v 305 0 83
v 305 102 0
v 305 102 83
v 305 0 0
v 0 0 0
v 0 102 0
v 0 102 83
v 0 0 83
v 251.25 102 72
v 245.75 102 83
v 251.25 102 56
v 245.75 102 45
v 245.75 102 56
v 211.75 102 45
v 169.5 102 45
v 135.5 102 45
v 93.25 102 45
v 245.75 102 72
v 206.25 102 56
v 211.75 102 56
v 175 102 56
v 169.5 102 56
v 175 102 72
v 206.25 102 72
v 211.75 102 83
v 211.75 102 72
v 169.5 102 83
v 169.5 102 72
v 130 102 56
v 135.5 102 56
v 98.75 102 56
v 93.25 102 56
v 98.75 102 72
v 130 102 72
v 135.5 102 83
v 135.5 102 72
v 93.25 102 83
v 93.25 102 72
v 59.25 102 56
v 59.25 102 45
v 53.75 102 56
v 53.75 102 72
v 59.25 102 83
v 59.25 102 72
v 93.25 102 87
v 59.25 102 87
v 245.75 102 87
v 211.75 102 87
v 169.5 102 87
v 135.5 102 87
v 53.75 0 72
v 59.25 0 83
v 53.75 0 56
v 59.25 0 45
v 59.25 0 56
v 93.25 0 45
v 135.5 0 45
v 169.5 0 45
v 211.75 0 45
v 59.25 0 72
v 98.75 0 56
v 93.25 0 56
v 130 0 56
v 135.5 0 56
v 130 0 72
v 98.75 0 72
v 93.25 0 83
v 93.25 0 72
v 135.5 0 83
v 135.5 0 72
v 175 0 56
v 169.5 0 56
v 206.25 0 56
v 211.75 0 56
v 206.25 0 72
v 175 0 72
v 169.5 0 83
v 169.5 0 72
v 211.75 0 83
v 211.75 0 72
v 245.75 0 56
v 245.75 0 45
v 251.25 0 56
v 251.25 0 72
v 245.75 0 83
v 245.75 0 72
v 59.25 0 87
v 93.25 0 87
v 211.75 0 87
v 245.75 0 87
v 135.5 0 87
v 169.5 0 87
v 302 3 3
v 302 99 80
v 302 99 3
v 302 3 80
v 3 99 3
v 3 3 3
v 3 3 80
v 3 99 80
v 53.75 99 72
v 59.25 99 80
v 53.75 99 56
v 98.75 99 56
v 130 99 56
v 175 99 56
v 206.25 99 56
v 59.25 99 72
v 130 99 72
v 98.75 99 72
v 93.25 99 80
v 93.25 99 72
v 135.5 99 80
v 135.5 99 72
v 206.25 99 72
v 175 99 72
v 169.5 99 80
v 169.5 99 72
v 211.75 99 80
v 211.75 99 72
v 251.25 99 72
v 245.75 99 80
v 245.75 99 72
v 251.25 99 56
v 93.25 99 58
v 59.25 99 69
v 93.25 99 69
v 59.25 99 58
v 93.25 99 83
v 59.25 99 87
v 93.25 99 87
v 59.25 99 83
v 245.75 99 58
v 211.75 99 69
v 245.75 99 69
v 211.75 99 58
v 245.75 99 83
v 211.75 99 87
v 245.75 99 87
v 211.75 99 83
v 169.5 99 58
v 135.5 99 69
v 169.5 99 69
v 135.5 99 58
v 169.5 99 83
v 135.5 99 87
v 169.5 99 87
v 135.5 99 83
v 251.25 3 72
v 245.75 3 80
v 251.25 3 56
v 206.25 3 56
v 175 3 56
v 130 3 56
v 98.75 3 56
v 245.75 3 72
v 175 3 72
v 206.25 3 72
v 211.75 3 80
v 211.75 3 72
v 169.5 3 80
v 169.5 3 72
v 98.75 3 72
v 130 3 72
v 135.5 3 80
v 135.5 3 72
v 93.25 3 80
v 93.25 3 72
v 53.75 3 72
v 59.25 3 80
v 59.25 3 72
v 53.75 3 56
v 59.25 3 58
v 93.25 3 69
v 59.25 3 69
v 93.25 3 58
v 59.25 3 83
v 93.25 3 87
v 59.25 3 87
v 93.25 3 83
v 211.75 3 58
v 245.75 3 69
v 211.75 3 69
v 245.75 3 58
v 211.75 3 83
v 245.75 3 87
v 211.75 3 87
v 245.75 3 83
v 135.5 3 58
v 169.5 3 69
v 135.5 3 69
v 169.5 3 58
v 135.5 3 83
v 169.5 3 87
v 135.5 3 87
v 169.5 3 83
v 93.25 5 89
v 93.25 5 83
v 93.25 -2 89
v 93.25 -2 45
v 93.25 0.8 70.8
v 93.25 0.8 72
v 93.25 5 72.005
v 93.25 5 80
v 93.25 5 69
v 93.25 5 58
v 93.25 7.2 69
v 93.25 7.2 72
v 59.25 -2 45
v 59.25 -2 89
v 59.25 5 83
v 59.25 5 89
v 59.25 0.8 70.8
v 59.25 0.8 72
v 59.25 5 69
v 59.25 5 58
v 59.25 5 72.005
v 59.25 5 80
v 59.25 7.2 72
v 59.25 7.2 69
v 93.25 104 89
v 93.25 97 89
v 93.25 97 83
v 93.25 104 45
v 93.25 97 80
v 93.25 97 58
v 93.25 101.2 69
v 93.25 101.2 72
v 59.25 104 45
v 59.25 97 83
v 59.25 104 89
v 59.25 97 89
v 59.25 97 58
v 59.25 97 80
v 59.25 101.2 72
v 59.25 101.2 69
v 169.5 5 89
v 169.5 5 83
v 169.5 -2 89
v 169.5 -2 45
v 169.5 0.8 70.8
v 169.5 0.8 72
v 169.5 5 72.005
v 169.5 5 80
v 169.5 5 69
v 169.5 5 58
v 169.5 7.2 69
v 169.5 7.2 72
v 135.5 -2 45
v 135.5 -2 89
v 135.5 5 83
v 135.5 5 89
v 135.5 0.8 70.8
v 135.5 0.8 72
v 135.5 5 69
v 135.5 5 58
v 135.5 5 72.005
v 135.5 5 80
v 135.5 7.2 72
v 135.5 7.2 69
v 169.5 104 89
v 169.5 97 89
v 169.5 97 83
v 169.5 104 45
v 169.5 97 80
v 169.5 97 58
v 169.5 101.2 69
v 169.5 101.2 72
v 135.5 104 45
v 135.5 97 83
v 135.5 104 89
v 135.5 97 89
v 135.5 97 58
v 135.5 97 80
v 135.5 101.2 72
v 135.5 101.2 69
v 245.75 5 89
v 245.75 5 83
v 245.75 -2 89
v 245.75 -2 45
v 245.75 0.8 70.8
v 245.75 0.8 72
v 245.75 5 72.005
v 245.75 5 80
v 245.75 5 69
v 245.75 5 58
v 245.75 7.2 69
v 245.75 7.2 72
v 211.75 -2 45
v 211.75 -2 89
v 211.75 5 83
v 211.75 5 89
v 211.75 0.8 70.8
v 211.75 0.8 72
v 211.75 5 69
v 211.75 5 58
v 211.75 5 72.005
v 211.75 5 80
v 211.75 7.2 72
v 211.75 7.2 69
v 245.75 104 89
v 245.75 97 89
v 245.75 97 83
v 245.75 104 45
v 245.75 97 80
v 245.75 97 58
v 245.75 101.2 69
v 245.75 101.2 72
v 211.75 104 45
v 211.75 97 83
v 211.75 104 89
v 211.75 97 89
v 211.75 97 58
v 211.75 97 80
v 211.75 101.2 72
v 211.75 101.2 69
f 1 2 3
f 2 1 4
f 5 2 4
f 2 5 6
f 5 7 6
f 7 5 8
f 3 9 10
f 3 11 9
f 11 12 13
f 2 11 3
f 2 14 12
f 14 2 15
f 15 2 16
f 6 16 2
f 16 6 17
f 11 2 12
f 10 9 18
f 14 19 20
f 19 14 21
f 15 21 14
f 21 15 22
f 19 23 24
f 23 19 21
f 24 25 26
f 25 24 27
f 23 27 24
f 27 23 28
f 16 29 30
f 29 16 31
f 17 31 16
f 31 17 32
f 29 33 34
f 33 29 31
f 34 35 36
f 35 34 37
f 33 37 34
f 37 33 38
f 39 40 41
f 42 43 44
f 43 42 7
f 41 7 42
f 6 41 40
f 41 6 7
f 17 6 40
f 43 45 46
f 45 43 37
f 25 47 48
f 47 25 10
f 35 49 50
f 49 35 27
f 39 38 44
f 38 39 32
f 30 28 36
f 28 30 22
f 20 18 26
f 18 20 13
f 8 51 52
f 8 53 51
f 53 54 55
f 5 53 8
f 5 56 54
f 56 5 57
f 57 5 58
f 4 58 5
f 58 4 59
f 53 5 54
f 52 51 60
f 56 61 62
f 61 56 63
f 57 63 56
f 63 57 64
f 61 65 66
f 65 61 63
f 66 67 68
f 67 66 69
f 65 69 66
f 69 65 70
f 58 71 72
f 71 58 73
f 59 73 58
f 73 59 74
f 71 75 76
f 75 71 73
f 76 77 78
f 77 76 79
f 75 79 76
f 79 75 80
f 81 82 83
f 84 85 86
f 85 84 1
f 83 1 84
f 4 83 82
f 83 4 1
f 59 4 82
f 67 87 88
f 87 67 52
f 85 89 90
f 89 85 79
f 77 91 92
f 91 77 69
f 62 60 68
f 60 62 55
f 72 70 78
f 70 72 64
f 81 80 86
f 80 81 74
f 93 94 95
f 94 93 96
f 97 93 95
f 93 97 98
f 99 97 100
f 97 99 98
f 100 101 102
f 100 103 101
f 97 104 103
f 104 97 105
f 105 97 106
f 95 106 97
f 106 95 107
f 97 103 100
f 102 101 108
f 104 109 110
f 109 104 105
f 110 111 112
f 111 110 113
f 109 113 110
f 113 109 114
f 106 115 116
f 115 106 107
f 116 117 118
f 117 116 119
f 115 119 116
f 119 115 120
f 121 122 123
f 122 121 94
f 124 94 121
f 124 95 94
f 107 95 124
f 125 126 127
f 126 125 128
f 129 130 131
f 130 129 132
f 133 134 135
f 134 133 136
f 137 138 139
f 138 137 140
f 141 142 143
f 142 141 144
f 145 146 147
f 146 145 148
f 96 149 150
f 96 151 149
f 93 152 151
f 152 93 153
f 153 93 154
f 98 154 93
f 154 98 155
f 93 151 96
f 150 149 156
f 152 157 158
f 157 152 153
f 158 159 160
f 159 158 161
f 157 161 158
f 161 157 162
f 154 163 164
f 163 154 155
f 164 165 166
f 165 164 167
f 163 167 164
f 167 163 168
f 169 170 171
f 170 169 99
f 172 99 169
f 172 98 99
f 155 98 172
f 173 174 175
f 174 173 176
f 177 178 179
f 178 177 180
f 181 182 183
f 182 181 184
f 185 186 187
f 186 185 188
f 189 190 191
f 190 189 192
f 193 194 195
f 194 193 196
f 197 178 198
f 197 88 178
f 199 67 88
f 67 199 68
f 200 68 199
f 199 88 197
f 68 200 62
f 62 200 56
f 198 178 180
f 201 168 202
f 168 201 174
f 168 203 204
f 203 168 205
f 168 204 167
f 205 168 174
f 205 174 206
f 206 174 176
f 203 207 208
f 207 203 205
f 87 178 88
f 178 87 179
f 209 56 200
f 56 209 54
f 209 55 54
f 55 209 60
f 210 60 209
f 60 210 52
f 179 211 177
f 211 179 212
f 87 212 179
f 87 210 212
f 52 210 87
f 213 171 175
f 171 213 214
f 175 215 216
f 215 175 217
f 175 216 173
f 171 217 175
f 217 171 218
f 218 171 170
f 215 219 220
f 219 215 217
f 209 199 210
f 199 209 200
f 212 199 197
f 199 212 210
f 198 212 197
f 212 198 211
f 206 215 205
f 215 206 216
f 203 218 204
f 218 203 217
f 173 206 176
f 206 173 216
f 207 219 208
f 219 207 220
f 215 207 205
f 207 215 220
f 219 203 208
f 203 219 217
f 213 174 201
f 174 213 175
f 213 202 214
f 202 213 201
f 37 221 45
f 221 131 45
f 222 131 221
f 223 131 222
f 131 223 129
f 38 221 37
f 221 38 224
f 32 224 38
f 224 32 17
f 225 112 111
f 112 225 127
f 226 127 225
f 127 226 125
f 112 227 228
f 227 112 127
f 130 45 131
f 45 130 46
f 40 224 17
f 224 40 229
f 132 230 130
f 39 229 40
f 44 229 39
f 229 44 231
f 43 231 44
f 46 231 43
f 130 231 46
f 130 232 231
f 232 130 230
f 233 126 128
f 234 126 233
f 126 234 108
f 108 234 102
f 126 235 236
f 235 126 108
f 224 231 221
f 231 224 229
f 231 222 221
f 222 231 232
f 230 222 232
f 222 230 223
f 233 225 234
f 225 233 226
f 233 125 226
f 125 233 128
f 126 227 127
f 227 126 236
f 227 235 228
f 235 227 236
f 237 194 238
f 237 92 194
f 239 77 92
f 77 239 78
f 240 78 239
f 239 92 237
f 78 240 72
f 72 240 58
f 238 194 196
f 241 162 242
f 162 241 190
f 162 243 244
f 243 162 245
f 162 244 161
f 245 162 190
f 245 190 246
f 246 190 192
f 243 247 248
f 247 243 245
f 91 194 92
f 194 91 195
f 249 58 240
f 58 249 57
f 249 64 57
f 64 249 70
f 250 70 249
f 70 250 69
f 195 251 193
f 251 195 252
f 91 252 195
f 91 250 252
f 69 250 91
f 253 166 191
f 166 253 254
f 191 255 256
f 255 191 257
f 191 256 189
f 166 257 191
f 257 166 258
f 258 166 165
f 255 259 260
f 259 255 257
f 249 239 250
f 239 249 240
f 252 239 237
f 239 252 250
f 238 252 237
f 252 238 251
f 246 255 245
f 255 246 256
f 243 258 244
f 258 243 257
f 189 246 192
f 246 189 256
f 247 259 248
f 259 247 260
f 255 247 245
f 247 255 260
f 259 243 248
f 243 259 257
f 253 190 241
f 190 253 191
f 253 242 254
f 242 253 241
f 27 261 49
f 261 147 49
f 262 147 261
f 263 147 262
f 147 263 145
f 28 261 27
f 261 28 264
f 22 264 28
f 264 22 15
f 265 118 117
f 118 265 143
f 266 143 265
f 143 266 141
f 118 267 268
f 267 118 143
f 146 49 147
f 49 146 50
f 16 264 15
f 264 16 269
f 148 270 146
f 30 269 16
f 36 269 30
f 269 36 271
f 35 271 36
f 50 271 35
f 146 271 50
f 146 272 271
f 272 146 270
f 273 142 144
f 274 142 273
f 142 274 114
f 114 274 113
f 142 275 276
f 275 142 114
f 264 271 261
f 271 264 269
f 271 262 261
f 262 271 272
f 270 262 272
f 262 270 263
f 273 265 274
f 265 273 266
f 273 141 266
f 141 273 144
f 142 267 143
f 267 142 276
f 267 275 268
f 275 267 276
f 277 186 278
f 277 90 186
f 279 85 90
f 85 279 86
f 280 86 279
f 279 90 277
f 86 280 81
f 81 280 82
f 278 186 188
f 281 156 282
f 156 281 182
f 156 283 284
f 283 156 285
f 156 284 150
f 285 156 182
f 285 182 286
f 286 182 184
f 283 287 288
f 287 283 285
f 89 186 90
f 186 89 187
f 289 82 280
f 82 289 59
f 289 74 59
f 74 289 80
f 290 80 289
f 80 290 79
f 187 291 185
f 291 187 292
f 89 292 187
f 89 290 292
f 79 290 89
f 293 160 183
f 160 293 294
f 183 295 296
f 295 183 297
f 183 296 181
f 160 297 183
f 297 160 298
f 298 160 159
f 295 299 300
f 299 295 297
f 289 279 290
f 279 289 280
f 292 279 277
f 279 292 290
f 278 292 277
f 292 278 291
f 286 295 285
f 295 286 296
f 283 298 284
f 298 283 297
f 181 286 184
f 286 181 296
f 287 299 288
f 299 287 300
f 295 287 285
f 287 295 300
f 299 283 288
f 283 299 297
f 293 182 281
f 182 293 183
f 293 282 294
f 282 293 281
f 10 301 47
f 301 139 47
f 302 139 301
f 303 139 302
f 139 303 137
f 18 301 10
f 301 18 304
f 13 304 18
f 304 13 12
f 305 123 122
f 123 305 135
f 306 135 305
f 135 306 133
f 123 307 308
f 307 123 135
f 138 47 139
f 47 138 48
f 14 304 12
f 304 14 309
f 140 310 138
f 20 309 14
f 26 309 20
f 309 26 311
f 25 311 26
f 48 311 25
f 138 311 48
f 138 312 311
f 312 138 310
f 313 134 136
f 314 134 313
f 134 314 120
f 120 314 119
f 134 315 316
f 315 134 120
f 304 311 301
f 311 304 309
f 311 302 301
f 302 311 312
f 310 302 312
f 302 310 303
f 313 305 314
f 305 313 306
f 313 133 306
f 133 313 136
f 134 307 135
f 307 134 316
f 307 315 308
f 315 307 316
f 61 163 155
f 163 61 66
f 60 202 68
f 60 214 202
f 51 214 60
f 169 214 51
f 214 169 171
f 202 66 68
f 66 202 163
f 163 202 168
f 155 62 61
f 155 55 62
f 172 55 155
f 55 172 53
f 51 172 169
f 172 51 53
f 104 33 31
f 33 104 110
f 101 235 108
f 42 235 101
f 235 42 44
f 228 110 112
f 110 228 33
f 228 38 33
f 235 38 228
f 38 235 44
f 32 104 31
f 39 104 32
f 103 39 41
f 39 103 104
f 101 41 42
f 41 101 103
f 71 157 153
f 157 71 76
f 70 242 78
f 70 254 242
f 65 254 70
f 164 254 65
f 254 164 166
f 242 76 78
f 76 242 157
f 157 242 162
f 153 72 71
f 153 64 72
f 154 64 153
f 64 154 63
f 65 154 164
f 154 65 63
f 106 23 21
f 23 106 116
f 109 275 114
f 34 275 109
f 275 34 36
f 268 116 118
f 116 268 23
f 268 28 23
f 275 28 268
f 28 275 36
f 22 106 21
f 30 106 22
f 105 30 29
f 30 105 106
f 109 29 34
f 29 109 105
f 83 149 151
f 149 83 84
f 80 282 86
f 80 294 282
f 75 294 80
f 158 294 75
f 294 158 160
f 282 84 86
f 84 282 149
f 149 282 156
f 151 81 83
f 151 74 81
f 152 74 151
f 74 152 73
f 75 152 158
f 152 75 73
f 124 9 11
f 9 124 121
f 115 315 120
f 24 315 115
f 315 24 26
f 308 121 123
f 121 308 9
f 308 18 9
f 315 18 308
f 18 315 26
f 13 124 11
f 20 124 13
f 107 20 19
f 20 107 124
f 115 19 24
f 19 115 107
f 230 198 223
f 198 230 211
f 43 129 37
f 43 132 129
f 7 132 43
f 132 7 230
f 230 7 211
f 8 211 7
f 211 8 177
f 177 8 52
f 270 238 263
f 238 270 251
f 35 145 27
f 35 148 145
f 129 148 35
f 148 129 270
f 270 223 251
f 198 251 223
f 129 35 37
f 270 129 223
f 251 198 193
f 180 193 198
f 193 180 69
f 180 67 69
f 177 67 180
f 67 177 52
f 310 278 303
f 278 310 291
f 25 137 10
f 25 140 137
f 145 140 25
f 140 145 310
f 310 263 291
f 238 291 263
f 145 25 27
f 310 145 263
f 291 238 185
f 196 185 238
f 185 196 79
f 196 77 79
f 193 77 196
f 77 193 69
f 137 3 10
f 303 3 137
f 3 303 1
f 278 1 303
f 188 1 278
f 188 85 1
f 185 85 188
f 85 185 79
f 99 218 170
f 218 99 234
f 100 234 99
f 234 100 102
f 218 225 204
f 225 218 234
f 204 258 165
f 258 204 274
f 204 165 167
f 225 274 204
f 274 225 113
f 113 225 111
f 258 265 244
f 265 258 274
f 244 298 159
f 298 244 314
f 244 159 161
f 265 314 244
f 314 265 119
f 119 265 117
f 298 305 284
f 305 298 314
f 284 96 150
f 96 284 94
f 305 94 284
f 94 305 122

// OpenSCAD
// 05_c_clip.scad
// RETROFIT ATTACHMENT — Version 5: Flexible C-Clip (Over-the-Wall Clasp)
//
// NEW tray (z=0..50, blue) has C-shaped clips — one per window (3/side × 2
// sides = 6 total).  Each clip has:
//   outer leg : rises on the OUTSIDE of the top-tray long wall
//   crown     : horizontal bridge that rides over the TOP EDGE of the wall
//   inner leg : drops INSIDE the top-tray wall; a retention nub snaps into
//               the window from the INSIDE, locking the top tray DOWN.
//
// Engagement: press crown down until nub pops into window.
// Release: squeeze outer leg inward (away from tray) to un-snap.
//
// TOP tray (z=50..83, grey) FIXED — ZERO geometry added.
//
// explode=0 engaged, explode=1 lifted apart.

explode = 0;

W    = 305;   D  = 102;   Hn = 50;   Ht = 33;   wall = 3;

win_w  = 45;   win_h = 16;   win_zc = 64;
function win_cx(i) = W * (i+1) / 4;

// C-clip geometry
cc_leg_t  = 2.0;   // leg thickness (thin = spring)
cc_w      = 34;    // clip width (X), fits inside window

// outer leg: root on new tray, rises to clear top of top tray
cc_outer_h = Ht + 4;   // above new-tray top face (reaches z = Hn+Ht+4 = 87)
cc_root    = 5;         // how far below new-tray top the outer leg roots

// crown (spans top-tray wall thickness + a little slop)
cc_crown_y = wall + 2.0;   // Y span of crown

// inner leg: drops from crown to just past window UPPER edge
// window upper edge absolute Z = win_zc + win_h/2 = 72
// inner leg bottom needs to reach to lock in window
inner_drop = Ht - (win_zc - Hn - win_h/2) + 2;   // from top of top tray down to window lower edge + 2

// retention nub (inside face of inner leg, pops into window)
nub_dep   = 2.2;
nub_h     = 3.0;
nub_taper = 1.2;
// nub sits at window upper edge height
nub_z = win_zc + win_h/2 - nub_h;   // absolute Z

expl = 45 * explode;

c_new  = [0.22, 0.55, 0.85, 1.00];
c_top  = [0.80, 0.80, 0.80, 0.80];
c_clip = [0.75, 0.20, 0.90, 1.00];   // purple

module top_tray() {
    color(c_top)
    translate([0, 0, Hn + expl])
    difference() {
        cube([W, D, Ht]);
        translate([wall, wall, -0.01])
            cube([W-2*wall, D-2*wall, Ht-wall+0.01]);
        for (i=[0:2]) {
            translate([win_cx(i)-win_w/2, -0.01, (win_zc-Hn)-win_h/2])
                cube([win_w, wall+0.02, win_h]);
            translate([win_cx(i)-win_w/2, D-wall-0.01, (win_zc-Hn)-win_h/2])
                cube([win_w, wall+0.02, win_h]);
        }
    }
}

module new_tray_body() {
    color(c_new)
    difference() {
        cube([W, D, Hn]);
        translate([wall, wall, wall])
            cube([W-2*wall, D-2*wall, Hn]);
    }
}

// C-clip for window win_i on given side
// side=0 → front (y=0), side=1 → back (y=D)
module c_clip(side, win_i) {
    cx = win_cx(win_i);

    // OUTER LEG position (outside the new/top tray long wall)
    y_out = (side==0) ? -cc_leg_t : D;

    // INNER LEG position (just inside the top-tray wall)
    y_in  = (side==0) ? wall : D - wall - cc_leg_t;

    // Crown: bridges from outer to inner leg at top of outer leg
    crown_y_start = (side==0) ? y_out : y_in;
    crown_y_span  = cc_crown_y + cc_leg_t;

    outer_bot  = Hn - cc_root;
    outer_top  = Hn + cc_outer_h;           // absolute Z of crown bottom
    inner_bot  = outer_top - inner_drop;     // absolute Z of inner leg bottom

    color(c_clip) {
        // OUTER LEG
        translate([cx - cc_w/2, y_out, outer_bot])
            cube([cc_w, cc_leg_t, cc_outer_h + cc_root]);

        // CROWN (flat horizontal bridge over top edge of top-tray wall)
        cy = (side==0) ? y_out : y_out - cc_crown_y;
        translate([cx - cc_w/2, cy, outer_top])
            cube([cc_w, cc_crown_y + cc_leg_t, cc_leg_t]);

        // INNER LEG
        translate([cx - cc_w/2, y_in, inner_bot])
            cube([cc_w, cc_leg_t, outer_top - inner_bot + cc_leg_t]);

        // RETENTION NUB on inner leg inner face (snaps into window)
        inwd = (side==0) ? 1 : -1;
        translate([cx - cc_w/2, y_in, nub_z])
        hull() {
            cube([cc_w, cc_leg_t + nub_dep, nub_h]);
            translate([0, inwd*(-nub_dep), nub_h - nub_taper])
                cube([cc_w, cc_leg_t, nub_taper + 0.01]);
        }
    }
}

// ASSEMBLY — all 3 windows × 2 sides
new_tray_body();
for (i=[0:2]) {
    c_clip(0, i);
    c_clip(1, i);
}
top_tray();
